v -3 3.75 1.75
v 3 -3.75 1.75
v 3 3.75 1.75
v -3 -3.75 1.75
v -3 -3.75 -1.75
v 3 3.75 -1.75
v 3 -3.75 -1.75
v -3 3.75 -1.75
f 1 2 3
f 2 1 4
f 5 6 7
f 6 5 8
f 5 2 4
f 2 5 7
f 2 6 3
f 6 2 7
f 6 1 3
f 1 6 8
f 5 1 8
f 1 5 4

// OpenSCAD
width=3.5;
length=7.5;
height=6;

cube([height, length, width], center=true);
